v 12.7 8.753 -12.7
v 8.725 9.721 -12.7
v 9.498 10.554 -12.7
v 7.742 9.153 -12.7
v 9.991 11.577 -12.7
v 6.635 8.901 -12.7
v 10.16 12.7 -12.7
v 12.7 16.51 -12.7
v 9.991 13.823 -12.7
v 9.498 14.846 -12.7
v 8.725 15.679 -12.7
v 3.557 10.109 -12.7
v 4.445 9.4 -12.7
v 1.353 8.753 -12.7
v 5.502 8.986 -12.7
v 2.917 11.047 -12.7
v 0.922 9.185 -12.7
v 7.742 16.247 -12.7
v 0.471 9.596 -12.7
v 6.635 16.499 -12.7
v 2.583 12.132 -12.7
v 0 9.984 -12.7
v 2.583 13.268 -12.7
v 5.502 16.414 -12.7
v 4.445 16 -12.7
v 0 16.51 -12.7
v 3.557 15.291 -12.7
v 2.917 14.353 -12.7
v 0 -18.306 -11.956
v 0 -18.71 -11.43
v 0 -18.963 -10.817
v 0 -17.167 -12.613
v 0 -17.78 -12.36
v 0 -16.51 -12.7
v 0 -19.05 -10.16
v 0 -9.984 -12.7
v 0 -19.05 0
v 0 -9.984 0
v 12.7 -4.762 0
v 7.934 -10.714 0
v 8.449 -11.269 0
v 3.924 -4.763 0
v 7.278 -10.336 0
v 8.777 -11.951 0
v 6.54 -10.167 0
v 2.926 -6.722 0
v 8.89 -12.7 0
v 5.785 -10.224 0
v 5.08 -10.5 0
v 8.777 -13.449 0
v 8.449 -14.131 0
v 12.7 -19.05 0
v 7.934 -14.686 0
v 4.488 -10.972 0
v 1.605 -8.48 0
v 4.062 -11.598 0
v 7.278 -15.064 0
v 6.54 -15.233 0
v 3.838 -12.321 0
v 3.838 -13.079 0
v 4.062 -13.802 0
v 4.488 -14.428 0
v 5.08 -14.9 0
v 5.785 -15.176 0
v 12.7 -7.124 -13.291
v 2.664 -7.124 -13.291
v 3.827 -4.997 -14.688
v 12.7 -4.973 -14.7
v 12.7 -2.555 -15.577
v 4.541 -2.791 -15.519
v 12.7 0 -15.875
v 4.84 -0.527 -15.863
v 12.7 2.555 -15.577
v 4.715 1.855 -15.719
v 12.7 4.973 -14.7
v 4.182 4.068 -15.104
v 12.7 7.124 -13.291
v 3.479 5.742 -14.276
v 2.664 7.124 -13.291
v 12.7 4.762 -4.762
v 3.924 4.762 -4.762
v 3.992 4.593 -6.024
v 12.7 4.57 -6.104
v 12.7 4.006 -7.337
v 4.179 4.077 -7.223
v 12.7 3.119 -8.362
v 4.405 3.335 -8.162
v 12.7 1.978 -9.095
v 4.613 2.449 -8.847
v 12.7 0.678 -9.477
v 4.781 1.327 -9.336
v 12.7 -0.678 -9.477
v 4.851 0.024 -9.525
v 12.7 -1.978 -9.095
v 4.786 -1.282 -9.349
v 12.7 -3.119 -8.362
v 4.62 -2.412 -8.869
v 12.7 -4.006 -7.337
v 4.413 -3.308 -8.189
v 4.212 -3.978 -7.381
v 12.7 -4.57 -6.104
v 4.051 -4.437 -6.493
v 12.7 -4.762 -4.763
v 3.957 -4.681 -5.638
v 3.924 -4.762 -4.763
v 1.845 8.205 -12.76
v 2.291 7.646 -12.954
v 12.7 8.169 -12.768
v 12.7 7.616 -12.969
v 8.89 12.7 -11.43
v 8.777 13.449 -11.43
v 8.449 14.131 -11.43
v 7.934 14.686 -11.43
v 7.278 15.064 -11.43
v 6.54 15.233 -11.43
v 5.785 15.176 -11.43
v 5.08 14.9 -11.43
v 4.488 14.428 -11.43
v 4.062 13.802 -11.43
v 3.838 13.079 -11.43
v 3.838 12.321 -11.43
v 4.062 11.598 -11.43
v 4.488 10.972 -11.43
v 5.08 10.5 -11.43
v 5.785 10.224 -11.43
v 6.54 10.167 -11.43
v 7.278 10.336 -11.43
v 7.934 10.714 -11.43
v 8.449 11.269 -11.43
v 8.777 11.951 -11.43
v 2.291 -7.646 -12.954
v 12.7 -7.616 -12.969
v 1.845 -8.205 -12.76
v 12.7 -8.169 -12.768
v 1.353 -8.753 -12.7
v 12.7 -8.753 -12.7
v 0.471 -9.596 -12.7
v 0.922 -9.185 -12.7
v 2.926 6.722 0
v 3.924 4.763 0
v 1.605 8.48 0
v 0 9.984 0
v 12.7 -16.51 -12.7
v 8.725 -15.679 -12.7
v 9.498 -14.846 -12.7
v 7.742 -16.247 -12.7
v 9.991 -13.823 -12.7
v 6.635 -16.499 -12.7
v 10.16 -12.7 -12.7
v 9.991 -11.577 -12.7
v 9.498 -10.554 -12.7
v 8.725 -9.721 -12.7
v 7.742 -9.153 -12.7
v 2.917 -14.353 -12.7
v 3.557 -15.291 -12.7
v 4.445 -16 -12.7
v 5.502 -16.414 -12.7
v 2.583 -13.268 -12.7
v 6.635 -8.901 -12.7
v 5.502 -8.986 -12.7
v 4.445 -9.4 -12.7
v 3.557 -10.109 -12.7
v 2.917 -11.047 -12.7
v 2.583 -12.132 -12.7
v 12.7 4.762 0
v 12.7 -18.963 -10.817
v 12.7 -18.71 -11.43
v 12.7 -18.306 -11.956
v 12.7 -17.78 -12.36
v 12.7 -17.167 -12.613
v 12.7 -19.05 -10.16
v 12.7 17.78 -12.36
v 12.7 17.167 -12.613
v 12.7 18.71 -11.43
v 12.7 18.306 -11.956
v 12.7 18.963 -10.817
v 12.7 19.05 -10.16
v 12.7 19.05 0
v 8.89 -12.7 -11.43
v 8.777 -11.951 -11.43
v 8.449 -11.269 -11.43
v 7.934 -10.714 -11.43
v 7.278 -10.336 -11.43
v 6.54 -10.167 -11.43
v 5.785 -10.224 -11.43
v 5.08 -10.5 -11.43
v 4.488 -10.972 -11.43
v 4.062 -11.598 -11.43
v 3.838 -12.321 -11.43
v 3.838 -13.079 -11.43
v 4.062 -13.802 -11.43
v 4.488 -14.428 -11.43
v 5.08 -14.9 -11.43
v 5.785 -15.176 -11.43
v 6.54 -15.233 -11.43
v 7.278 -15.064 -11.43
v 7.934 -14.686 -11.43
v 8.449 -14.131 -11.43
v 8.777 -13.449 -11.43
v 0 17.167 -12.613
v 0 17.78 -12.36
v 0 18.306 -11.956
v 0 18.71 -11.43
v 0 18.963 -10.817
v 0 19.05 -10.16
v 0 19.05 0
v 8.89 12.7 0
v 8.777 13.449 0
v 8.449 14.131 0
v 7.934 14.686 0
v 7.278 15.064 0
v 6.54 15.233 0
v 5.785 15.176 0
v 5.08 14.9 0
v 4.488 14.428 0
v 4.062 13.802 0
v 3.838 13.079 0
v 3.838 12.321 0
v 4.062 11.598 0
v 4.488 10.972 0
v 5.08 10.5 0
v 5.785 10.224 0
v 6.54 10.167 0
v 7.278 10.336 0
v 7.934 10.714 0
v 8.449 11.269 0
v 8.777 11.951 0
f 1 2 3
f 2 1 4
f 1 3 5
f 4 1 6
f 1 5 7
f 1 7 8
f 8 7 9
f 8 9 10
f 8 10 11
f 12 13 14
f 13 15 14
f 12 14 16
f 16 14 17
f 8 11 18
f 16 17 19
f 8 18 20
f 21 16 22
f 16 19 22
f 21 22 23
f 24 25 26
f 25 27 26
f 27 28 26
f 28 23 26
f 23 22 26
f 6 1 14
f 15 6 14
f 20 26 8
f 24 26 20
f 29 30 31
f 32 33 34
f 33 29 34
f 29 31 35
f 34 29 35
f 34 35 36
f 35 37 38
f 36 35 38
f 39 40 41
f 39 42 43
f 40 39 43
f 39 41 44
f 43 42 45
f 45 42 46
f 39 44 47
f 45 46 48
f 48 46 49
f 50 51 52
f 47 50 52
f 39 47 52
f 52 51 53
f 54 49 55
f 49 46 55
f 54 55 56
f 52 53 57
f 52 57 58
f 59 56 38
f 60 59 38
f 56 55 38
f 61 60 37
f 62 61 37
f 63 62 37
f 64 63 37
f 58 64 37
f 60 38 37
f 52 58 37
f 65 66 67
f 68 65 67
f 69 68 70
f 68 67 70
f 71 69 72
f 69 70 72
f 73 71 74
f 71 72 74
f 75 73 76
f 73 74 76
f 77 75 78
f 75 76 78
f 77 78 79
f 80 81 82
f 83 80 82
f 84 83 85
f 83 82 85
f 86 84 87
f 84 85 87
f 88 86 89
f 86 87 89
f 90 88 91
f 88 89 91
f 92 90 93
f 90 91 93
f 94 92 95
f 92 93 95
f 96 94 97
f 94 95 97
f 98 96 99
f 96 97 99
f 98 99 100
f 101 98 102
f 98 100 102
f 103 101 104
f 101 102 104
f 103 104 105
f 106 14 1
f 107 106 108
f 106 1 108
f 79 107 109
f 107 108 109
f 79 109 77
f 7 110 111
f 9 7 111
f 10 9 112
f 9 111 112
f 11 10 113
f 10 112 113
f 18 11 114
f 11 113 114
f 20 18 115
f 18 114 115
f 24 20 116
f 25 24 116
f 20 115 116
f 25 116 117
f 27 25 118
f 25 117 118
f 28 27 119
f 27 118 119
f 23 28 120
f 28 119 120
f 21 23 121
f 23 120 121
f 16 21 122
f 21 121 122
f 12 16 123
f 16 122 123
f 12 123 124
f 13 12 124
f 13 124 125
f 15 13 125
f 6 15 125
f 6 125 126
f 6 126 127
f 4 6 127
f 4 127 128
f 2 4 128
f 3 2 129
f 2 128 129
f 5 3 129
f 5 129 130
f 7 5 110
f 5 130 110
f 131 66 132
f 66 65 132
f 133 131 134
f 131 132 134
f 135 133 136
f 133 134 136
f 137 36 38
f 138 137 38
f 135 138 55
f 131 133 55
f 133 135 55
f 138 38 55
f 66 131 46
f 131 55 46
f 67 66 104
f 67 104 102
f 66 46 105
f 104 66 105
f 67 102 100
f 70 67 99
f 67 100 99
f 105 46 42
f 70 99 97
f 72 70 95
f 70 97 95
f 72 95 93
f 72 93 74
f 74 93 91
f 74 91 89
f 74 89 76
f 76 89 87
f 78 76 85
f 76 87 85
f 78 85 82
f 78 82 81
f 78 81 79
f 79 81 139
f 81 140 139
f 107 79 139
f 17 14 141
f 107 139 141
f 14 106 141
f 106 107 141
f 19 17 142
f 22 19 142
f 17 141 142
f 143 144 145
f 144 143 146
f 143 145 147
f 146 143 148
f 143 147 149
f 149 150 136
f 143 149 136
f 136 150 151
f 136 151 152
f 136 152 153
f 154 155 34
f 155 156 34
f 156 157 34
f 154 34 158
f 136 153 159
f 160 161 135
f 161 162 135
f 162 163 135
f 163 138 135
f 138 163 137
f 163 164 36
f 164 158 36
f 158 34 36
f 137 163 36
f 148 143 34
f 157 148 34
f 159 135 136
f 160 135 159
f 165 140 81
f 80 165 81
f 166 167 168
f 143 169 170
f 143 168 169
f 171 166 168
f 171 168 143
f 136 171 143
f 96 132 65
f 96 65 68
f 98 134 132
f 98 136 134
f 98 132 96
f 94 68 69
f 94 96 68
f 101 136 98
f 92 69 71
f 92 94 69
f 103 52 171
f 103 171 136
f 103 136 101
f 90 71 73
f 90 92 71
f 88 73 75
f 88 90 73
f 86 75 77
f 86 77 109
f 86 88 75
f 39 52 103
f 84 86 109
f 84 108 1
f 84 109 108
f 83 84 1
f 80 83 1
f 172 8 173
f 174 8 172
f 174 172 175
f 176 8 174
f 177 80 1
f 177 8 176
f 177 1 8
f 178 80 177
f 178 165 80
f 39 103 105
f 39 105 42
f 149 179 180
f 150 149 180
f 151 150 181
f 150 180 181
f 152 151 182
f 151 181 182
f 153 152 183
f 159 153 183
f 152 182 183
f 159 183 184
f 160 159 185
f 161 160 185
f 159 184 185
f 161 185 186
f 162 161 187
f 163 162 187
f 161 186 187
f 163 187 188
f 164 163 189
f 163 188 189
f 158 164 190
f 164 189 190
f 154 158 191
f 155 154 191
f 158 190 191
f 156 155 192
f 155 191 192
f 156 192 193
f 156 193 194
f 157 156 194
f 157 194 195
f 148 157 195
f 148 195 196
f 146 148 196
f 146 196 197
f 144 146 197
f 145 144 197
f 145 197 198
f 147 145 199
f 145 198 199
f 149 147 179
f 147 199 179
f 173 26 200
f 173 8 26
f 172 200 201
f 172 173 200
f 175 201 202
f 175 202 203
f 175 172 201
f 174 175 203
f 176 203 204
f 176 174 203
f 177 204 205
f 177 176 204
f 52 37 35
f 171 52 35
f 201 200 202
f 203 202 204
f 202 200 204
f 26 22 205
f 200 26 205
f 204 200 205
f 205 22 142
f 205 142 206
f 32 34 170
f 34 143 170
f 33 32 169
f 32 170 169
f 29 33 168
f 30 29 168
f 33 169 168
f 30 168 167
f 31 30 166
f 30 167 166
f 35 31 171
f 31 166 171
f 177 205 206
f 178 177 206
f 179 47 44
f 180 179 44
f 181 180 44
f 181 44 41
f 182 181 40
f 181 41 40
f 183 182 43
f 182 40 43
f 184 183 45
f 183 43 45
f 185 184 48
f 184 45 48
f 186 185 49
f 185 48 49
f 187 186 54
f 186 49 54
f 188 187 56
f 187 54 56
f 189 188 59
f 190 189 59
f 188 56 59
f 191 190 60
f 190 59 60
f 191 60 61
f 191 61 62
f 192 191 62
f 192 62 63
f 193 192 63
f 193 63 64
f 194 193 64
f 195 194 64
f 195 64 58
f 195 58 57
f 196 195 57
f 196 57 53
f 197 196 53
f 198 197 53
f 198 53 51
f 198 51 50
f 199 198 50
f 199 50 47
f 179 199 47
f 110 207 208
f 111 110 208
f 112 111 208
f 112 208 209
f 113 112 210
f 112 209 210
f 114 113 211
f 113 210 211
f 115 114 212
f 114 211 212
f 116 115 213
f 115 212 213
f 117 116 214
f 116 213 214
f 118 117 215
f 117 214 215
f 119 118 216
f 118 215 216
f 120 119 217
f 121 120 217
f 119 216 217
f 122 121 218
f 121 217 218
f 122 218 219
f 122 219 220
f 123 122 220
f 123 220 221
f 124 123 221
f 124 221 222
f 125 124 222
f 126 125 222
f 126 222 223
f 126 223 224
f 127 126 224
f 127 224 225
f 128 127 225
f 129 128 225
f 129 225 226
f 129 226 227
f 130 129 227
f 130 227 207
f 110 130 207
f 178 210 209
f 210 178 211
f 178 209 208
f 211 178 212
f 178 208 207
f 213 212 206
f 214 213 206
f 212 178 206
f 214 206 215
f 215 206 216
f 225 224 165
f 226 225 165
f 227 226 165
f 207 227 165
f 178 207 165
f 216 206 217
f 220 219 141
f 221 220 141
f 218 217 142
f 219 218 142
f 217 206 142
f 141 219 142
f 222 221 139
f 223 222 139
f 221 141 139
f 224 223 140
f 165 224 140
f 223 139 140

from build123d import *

# Parameters (mm, degrees)
F2_DEPTH = 12.7
F0_R     = 2.54
F3_DEPTH = 25.4
F4_R     = 2.54
F5_SIZE  = 1.27


with BuildPart() as f2:
    # F1 (on Right) → F2 (new body)
    with BuildSketch(Plane.YZ):
        with BuildLine():
            Line((4.7625, 0), (4.7625, -4.7625))
            ThreePointArc((4.7625, -4.7625), (0, -9.525), (-4.7625, -4.7625))
            Line((-4.7625, -4.7625), (-4.7625, 0))
            Line((-4.7625, 0), (-19.05, 0))
            Line((-19.05, 0), (-19.05, -12.7))
            Line((-19.05, -12.7), (-7.77713, -12.7))
            ThreePointArc((-7.77713, -12.7), (0, -15.875), (7.77713, -12.7))
            Line((7.77713, -12.7), (19.05, -12.7))
            Line((19.05, -12.7), (19.05, 0))
            Line((19.05, 0), (4.7625, 0))
        make_face()
    extrude(amount=F2_DEPTH)

    # F0 (on Top) → F3 (cut)
    with BuildSketch(Plane.XY):
        with Locations((6.35, 12.7)):
            Circle(F0_R)
        with Locations((6.35, -12.7)):
            Circle(F0_R)
        with BuildLine():
            ThreePointArc((0, -9.984122), (4.850968, 0), (0, 9.984122))
            Line((0, 9.984122), (0, -9.984122))
        make_face()
    extrude(amount=-F3_DEPTH, mode=Mode.SUBTRACT)

    # F4
    f4_edges = [f2.edges().sort_by_distance(p)[0] for p in [
        (6.35, 19.05, -12.7),
        (6.35, -19.05, -12.7),
        (7.4456, 7.77713, -12.7),
        (7.4456, -7.77713, -12.7),
    ]]
    fillet(f4_edges, radius=F4_R)

    # F5
    f5_edges = [f2.edges().sort_by_distance(p)[0] for p in [
        (3.81, 12.7, -12.7),
        (3.81, -12.7, -12.7),
    ]]
    chamfer(f5_edges, length=F5_SIZE)


solid = f2.part
